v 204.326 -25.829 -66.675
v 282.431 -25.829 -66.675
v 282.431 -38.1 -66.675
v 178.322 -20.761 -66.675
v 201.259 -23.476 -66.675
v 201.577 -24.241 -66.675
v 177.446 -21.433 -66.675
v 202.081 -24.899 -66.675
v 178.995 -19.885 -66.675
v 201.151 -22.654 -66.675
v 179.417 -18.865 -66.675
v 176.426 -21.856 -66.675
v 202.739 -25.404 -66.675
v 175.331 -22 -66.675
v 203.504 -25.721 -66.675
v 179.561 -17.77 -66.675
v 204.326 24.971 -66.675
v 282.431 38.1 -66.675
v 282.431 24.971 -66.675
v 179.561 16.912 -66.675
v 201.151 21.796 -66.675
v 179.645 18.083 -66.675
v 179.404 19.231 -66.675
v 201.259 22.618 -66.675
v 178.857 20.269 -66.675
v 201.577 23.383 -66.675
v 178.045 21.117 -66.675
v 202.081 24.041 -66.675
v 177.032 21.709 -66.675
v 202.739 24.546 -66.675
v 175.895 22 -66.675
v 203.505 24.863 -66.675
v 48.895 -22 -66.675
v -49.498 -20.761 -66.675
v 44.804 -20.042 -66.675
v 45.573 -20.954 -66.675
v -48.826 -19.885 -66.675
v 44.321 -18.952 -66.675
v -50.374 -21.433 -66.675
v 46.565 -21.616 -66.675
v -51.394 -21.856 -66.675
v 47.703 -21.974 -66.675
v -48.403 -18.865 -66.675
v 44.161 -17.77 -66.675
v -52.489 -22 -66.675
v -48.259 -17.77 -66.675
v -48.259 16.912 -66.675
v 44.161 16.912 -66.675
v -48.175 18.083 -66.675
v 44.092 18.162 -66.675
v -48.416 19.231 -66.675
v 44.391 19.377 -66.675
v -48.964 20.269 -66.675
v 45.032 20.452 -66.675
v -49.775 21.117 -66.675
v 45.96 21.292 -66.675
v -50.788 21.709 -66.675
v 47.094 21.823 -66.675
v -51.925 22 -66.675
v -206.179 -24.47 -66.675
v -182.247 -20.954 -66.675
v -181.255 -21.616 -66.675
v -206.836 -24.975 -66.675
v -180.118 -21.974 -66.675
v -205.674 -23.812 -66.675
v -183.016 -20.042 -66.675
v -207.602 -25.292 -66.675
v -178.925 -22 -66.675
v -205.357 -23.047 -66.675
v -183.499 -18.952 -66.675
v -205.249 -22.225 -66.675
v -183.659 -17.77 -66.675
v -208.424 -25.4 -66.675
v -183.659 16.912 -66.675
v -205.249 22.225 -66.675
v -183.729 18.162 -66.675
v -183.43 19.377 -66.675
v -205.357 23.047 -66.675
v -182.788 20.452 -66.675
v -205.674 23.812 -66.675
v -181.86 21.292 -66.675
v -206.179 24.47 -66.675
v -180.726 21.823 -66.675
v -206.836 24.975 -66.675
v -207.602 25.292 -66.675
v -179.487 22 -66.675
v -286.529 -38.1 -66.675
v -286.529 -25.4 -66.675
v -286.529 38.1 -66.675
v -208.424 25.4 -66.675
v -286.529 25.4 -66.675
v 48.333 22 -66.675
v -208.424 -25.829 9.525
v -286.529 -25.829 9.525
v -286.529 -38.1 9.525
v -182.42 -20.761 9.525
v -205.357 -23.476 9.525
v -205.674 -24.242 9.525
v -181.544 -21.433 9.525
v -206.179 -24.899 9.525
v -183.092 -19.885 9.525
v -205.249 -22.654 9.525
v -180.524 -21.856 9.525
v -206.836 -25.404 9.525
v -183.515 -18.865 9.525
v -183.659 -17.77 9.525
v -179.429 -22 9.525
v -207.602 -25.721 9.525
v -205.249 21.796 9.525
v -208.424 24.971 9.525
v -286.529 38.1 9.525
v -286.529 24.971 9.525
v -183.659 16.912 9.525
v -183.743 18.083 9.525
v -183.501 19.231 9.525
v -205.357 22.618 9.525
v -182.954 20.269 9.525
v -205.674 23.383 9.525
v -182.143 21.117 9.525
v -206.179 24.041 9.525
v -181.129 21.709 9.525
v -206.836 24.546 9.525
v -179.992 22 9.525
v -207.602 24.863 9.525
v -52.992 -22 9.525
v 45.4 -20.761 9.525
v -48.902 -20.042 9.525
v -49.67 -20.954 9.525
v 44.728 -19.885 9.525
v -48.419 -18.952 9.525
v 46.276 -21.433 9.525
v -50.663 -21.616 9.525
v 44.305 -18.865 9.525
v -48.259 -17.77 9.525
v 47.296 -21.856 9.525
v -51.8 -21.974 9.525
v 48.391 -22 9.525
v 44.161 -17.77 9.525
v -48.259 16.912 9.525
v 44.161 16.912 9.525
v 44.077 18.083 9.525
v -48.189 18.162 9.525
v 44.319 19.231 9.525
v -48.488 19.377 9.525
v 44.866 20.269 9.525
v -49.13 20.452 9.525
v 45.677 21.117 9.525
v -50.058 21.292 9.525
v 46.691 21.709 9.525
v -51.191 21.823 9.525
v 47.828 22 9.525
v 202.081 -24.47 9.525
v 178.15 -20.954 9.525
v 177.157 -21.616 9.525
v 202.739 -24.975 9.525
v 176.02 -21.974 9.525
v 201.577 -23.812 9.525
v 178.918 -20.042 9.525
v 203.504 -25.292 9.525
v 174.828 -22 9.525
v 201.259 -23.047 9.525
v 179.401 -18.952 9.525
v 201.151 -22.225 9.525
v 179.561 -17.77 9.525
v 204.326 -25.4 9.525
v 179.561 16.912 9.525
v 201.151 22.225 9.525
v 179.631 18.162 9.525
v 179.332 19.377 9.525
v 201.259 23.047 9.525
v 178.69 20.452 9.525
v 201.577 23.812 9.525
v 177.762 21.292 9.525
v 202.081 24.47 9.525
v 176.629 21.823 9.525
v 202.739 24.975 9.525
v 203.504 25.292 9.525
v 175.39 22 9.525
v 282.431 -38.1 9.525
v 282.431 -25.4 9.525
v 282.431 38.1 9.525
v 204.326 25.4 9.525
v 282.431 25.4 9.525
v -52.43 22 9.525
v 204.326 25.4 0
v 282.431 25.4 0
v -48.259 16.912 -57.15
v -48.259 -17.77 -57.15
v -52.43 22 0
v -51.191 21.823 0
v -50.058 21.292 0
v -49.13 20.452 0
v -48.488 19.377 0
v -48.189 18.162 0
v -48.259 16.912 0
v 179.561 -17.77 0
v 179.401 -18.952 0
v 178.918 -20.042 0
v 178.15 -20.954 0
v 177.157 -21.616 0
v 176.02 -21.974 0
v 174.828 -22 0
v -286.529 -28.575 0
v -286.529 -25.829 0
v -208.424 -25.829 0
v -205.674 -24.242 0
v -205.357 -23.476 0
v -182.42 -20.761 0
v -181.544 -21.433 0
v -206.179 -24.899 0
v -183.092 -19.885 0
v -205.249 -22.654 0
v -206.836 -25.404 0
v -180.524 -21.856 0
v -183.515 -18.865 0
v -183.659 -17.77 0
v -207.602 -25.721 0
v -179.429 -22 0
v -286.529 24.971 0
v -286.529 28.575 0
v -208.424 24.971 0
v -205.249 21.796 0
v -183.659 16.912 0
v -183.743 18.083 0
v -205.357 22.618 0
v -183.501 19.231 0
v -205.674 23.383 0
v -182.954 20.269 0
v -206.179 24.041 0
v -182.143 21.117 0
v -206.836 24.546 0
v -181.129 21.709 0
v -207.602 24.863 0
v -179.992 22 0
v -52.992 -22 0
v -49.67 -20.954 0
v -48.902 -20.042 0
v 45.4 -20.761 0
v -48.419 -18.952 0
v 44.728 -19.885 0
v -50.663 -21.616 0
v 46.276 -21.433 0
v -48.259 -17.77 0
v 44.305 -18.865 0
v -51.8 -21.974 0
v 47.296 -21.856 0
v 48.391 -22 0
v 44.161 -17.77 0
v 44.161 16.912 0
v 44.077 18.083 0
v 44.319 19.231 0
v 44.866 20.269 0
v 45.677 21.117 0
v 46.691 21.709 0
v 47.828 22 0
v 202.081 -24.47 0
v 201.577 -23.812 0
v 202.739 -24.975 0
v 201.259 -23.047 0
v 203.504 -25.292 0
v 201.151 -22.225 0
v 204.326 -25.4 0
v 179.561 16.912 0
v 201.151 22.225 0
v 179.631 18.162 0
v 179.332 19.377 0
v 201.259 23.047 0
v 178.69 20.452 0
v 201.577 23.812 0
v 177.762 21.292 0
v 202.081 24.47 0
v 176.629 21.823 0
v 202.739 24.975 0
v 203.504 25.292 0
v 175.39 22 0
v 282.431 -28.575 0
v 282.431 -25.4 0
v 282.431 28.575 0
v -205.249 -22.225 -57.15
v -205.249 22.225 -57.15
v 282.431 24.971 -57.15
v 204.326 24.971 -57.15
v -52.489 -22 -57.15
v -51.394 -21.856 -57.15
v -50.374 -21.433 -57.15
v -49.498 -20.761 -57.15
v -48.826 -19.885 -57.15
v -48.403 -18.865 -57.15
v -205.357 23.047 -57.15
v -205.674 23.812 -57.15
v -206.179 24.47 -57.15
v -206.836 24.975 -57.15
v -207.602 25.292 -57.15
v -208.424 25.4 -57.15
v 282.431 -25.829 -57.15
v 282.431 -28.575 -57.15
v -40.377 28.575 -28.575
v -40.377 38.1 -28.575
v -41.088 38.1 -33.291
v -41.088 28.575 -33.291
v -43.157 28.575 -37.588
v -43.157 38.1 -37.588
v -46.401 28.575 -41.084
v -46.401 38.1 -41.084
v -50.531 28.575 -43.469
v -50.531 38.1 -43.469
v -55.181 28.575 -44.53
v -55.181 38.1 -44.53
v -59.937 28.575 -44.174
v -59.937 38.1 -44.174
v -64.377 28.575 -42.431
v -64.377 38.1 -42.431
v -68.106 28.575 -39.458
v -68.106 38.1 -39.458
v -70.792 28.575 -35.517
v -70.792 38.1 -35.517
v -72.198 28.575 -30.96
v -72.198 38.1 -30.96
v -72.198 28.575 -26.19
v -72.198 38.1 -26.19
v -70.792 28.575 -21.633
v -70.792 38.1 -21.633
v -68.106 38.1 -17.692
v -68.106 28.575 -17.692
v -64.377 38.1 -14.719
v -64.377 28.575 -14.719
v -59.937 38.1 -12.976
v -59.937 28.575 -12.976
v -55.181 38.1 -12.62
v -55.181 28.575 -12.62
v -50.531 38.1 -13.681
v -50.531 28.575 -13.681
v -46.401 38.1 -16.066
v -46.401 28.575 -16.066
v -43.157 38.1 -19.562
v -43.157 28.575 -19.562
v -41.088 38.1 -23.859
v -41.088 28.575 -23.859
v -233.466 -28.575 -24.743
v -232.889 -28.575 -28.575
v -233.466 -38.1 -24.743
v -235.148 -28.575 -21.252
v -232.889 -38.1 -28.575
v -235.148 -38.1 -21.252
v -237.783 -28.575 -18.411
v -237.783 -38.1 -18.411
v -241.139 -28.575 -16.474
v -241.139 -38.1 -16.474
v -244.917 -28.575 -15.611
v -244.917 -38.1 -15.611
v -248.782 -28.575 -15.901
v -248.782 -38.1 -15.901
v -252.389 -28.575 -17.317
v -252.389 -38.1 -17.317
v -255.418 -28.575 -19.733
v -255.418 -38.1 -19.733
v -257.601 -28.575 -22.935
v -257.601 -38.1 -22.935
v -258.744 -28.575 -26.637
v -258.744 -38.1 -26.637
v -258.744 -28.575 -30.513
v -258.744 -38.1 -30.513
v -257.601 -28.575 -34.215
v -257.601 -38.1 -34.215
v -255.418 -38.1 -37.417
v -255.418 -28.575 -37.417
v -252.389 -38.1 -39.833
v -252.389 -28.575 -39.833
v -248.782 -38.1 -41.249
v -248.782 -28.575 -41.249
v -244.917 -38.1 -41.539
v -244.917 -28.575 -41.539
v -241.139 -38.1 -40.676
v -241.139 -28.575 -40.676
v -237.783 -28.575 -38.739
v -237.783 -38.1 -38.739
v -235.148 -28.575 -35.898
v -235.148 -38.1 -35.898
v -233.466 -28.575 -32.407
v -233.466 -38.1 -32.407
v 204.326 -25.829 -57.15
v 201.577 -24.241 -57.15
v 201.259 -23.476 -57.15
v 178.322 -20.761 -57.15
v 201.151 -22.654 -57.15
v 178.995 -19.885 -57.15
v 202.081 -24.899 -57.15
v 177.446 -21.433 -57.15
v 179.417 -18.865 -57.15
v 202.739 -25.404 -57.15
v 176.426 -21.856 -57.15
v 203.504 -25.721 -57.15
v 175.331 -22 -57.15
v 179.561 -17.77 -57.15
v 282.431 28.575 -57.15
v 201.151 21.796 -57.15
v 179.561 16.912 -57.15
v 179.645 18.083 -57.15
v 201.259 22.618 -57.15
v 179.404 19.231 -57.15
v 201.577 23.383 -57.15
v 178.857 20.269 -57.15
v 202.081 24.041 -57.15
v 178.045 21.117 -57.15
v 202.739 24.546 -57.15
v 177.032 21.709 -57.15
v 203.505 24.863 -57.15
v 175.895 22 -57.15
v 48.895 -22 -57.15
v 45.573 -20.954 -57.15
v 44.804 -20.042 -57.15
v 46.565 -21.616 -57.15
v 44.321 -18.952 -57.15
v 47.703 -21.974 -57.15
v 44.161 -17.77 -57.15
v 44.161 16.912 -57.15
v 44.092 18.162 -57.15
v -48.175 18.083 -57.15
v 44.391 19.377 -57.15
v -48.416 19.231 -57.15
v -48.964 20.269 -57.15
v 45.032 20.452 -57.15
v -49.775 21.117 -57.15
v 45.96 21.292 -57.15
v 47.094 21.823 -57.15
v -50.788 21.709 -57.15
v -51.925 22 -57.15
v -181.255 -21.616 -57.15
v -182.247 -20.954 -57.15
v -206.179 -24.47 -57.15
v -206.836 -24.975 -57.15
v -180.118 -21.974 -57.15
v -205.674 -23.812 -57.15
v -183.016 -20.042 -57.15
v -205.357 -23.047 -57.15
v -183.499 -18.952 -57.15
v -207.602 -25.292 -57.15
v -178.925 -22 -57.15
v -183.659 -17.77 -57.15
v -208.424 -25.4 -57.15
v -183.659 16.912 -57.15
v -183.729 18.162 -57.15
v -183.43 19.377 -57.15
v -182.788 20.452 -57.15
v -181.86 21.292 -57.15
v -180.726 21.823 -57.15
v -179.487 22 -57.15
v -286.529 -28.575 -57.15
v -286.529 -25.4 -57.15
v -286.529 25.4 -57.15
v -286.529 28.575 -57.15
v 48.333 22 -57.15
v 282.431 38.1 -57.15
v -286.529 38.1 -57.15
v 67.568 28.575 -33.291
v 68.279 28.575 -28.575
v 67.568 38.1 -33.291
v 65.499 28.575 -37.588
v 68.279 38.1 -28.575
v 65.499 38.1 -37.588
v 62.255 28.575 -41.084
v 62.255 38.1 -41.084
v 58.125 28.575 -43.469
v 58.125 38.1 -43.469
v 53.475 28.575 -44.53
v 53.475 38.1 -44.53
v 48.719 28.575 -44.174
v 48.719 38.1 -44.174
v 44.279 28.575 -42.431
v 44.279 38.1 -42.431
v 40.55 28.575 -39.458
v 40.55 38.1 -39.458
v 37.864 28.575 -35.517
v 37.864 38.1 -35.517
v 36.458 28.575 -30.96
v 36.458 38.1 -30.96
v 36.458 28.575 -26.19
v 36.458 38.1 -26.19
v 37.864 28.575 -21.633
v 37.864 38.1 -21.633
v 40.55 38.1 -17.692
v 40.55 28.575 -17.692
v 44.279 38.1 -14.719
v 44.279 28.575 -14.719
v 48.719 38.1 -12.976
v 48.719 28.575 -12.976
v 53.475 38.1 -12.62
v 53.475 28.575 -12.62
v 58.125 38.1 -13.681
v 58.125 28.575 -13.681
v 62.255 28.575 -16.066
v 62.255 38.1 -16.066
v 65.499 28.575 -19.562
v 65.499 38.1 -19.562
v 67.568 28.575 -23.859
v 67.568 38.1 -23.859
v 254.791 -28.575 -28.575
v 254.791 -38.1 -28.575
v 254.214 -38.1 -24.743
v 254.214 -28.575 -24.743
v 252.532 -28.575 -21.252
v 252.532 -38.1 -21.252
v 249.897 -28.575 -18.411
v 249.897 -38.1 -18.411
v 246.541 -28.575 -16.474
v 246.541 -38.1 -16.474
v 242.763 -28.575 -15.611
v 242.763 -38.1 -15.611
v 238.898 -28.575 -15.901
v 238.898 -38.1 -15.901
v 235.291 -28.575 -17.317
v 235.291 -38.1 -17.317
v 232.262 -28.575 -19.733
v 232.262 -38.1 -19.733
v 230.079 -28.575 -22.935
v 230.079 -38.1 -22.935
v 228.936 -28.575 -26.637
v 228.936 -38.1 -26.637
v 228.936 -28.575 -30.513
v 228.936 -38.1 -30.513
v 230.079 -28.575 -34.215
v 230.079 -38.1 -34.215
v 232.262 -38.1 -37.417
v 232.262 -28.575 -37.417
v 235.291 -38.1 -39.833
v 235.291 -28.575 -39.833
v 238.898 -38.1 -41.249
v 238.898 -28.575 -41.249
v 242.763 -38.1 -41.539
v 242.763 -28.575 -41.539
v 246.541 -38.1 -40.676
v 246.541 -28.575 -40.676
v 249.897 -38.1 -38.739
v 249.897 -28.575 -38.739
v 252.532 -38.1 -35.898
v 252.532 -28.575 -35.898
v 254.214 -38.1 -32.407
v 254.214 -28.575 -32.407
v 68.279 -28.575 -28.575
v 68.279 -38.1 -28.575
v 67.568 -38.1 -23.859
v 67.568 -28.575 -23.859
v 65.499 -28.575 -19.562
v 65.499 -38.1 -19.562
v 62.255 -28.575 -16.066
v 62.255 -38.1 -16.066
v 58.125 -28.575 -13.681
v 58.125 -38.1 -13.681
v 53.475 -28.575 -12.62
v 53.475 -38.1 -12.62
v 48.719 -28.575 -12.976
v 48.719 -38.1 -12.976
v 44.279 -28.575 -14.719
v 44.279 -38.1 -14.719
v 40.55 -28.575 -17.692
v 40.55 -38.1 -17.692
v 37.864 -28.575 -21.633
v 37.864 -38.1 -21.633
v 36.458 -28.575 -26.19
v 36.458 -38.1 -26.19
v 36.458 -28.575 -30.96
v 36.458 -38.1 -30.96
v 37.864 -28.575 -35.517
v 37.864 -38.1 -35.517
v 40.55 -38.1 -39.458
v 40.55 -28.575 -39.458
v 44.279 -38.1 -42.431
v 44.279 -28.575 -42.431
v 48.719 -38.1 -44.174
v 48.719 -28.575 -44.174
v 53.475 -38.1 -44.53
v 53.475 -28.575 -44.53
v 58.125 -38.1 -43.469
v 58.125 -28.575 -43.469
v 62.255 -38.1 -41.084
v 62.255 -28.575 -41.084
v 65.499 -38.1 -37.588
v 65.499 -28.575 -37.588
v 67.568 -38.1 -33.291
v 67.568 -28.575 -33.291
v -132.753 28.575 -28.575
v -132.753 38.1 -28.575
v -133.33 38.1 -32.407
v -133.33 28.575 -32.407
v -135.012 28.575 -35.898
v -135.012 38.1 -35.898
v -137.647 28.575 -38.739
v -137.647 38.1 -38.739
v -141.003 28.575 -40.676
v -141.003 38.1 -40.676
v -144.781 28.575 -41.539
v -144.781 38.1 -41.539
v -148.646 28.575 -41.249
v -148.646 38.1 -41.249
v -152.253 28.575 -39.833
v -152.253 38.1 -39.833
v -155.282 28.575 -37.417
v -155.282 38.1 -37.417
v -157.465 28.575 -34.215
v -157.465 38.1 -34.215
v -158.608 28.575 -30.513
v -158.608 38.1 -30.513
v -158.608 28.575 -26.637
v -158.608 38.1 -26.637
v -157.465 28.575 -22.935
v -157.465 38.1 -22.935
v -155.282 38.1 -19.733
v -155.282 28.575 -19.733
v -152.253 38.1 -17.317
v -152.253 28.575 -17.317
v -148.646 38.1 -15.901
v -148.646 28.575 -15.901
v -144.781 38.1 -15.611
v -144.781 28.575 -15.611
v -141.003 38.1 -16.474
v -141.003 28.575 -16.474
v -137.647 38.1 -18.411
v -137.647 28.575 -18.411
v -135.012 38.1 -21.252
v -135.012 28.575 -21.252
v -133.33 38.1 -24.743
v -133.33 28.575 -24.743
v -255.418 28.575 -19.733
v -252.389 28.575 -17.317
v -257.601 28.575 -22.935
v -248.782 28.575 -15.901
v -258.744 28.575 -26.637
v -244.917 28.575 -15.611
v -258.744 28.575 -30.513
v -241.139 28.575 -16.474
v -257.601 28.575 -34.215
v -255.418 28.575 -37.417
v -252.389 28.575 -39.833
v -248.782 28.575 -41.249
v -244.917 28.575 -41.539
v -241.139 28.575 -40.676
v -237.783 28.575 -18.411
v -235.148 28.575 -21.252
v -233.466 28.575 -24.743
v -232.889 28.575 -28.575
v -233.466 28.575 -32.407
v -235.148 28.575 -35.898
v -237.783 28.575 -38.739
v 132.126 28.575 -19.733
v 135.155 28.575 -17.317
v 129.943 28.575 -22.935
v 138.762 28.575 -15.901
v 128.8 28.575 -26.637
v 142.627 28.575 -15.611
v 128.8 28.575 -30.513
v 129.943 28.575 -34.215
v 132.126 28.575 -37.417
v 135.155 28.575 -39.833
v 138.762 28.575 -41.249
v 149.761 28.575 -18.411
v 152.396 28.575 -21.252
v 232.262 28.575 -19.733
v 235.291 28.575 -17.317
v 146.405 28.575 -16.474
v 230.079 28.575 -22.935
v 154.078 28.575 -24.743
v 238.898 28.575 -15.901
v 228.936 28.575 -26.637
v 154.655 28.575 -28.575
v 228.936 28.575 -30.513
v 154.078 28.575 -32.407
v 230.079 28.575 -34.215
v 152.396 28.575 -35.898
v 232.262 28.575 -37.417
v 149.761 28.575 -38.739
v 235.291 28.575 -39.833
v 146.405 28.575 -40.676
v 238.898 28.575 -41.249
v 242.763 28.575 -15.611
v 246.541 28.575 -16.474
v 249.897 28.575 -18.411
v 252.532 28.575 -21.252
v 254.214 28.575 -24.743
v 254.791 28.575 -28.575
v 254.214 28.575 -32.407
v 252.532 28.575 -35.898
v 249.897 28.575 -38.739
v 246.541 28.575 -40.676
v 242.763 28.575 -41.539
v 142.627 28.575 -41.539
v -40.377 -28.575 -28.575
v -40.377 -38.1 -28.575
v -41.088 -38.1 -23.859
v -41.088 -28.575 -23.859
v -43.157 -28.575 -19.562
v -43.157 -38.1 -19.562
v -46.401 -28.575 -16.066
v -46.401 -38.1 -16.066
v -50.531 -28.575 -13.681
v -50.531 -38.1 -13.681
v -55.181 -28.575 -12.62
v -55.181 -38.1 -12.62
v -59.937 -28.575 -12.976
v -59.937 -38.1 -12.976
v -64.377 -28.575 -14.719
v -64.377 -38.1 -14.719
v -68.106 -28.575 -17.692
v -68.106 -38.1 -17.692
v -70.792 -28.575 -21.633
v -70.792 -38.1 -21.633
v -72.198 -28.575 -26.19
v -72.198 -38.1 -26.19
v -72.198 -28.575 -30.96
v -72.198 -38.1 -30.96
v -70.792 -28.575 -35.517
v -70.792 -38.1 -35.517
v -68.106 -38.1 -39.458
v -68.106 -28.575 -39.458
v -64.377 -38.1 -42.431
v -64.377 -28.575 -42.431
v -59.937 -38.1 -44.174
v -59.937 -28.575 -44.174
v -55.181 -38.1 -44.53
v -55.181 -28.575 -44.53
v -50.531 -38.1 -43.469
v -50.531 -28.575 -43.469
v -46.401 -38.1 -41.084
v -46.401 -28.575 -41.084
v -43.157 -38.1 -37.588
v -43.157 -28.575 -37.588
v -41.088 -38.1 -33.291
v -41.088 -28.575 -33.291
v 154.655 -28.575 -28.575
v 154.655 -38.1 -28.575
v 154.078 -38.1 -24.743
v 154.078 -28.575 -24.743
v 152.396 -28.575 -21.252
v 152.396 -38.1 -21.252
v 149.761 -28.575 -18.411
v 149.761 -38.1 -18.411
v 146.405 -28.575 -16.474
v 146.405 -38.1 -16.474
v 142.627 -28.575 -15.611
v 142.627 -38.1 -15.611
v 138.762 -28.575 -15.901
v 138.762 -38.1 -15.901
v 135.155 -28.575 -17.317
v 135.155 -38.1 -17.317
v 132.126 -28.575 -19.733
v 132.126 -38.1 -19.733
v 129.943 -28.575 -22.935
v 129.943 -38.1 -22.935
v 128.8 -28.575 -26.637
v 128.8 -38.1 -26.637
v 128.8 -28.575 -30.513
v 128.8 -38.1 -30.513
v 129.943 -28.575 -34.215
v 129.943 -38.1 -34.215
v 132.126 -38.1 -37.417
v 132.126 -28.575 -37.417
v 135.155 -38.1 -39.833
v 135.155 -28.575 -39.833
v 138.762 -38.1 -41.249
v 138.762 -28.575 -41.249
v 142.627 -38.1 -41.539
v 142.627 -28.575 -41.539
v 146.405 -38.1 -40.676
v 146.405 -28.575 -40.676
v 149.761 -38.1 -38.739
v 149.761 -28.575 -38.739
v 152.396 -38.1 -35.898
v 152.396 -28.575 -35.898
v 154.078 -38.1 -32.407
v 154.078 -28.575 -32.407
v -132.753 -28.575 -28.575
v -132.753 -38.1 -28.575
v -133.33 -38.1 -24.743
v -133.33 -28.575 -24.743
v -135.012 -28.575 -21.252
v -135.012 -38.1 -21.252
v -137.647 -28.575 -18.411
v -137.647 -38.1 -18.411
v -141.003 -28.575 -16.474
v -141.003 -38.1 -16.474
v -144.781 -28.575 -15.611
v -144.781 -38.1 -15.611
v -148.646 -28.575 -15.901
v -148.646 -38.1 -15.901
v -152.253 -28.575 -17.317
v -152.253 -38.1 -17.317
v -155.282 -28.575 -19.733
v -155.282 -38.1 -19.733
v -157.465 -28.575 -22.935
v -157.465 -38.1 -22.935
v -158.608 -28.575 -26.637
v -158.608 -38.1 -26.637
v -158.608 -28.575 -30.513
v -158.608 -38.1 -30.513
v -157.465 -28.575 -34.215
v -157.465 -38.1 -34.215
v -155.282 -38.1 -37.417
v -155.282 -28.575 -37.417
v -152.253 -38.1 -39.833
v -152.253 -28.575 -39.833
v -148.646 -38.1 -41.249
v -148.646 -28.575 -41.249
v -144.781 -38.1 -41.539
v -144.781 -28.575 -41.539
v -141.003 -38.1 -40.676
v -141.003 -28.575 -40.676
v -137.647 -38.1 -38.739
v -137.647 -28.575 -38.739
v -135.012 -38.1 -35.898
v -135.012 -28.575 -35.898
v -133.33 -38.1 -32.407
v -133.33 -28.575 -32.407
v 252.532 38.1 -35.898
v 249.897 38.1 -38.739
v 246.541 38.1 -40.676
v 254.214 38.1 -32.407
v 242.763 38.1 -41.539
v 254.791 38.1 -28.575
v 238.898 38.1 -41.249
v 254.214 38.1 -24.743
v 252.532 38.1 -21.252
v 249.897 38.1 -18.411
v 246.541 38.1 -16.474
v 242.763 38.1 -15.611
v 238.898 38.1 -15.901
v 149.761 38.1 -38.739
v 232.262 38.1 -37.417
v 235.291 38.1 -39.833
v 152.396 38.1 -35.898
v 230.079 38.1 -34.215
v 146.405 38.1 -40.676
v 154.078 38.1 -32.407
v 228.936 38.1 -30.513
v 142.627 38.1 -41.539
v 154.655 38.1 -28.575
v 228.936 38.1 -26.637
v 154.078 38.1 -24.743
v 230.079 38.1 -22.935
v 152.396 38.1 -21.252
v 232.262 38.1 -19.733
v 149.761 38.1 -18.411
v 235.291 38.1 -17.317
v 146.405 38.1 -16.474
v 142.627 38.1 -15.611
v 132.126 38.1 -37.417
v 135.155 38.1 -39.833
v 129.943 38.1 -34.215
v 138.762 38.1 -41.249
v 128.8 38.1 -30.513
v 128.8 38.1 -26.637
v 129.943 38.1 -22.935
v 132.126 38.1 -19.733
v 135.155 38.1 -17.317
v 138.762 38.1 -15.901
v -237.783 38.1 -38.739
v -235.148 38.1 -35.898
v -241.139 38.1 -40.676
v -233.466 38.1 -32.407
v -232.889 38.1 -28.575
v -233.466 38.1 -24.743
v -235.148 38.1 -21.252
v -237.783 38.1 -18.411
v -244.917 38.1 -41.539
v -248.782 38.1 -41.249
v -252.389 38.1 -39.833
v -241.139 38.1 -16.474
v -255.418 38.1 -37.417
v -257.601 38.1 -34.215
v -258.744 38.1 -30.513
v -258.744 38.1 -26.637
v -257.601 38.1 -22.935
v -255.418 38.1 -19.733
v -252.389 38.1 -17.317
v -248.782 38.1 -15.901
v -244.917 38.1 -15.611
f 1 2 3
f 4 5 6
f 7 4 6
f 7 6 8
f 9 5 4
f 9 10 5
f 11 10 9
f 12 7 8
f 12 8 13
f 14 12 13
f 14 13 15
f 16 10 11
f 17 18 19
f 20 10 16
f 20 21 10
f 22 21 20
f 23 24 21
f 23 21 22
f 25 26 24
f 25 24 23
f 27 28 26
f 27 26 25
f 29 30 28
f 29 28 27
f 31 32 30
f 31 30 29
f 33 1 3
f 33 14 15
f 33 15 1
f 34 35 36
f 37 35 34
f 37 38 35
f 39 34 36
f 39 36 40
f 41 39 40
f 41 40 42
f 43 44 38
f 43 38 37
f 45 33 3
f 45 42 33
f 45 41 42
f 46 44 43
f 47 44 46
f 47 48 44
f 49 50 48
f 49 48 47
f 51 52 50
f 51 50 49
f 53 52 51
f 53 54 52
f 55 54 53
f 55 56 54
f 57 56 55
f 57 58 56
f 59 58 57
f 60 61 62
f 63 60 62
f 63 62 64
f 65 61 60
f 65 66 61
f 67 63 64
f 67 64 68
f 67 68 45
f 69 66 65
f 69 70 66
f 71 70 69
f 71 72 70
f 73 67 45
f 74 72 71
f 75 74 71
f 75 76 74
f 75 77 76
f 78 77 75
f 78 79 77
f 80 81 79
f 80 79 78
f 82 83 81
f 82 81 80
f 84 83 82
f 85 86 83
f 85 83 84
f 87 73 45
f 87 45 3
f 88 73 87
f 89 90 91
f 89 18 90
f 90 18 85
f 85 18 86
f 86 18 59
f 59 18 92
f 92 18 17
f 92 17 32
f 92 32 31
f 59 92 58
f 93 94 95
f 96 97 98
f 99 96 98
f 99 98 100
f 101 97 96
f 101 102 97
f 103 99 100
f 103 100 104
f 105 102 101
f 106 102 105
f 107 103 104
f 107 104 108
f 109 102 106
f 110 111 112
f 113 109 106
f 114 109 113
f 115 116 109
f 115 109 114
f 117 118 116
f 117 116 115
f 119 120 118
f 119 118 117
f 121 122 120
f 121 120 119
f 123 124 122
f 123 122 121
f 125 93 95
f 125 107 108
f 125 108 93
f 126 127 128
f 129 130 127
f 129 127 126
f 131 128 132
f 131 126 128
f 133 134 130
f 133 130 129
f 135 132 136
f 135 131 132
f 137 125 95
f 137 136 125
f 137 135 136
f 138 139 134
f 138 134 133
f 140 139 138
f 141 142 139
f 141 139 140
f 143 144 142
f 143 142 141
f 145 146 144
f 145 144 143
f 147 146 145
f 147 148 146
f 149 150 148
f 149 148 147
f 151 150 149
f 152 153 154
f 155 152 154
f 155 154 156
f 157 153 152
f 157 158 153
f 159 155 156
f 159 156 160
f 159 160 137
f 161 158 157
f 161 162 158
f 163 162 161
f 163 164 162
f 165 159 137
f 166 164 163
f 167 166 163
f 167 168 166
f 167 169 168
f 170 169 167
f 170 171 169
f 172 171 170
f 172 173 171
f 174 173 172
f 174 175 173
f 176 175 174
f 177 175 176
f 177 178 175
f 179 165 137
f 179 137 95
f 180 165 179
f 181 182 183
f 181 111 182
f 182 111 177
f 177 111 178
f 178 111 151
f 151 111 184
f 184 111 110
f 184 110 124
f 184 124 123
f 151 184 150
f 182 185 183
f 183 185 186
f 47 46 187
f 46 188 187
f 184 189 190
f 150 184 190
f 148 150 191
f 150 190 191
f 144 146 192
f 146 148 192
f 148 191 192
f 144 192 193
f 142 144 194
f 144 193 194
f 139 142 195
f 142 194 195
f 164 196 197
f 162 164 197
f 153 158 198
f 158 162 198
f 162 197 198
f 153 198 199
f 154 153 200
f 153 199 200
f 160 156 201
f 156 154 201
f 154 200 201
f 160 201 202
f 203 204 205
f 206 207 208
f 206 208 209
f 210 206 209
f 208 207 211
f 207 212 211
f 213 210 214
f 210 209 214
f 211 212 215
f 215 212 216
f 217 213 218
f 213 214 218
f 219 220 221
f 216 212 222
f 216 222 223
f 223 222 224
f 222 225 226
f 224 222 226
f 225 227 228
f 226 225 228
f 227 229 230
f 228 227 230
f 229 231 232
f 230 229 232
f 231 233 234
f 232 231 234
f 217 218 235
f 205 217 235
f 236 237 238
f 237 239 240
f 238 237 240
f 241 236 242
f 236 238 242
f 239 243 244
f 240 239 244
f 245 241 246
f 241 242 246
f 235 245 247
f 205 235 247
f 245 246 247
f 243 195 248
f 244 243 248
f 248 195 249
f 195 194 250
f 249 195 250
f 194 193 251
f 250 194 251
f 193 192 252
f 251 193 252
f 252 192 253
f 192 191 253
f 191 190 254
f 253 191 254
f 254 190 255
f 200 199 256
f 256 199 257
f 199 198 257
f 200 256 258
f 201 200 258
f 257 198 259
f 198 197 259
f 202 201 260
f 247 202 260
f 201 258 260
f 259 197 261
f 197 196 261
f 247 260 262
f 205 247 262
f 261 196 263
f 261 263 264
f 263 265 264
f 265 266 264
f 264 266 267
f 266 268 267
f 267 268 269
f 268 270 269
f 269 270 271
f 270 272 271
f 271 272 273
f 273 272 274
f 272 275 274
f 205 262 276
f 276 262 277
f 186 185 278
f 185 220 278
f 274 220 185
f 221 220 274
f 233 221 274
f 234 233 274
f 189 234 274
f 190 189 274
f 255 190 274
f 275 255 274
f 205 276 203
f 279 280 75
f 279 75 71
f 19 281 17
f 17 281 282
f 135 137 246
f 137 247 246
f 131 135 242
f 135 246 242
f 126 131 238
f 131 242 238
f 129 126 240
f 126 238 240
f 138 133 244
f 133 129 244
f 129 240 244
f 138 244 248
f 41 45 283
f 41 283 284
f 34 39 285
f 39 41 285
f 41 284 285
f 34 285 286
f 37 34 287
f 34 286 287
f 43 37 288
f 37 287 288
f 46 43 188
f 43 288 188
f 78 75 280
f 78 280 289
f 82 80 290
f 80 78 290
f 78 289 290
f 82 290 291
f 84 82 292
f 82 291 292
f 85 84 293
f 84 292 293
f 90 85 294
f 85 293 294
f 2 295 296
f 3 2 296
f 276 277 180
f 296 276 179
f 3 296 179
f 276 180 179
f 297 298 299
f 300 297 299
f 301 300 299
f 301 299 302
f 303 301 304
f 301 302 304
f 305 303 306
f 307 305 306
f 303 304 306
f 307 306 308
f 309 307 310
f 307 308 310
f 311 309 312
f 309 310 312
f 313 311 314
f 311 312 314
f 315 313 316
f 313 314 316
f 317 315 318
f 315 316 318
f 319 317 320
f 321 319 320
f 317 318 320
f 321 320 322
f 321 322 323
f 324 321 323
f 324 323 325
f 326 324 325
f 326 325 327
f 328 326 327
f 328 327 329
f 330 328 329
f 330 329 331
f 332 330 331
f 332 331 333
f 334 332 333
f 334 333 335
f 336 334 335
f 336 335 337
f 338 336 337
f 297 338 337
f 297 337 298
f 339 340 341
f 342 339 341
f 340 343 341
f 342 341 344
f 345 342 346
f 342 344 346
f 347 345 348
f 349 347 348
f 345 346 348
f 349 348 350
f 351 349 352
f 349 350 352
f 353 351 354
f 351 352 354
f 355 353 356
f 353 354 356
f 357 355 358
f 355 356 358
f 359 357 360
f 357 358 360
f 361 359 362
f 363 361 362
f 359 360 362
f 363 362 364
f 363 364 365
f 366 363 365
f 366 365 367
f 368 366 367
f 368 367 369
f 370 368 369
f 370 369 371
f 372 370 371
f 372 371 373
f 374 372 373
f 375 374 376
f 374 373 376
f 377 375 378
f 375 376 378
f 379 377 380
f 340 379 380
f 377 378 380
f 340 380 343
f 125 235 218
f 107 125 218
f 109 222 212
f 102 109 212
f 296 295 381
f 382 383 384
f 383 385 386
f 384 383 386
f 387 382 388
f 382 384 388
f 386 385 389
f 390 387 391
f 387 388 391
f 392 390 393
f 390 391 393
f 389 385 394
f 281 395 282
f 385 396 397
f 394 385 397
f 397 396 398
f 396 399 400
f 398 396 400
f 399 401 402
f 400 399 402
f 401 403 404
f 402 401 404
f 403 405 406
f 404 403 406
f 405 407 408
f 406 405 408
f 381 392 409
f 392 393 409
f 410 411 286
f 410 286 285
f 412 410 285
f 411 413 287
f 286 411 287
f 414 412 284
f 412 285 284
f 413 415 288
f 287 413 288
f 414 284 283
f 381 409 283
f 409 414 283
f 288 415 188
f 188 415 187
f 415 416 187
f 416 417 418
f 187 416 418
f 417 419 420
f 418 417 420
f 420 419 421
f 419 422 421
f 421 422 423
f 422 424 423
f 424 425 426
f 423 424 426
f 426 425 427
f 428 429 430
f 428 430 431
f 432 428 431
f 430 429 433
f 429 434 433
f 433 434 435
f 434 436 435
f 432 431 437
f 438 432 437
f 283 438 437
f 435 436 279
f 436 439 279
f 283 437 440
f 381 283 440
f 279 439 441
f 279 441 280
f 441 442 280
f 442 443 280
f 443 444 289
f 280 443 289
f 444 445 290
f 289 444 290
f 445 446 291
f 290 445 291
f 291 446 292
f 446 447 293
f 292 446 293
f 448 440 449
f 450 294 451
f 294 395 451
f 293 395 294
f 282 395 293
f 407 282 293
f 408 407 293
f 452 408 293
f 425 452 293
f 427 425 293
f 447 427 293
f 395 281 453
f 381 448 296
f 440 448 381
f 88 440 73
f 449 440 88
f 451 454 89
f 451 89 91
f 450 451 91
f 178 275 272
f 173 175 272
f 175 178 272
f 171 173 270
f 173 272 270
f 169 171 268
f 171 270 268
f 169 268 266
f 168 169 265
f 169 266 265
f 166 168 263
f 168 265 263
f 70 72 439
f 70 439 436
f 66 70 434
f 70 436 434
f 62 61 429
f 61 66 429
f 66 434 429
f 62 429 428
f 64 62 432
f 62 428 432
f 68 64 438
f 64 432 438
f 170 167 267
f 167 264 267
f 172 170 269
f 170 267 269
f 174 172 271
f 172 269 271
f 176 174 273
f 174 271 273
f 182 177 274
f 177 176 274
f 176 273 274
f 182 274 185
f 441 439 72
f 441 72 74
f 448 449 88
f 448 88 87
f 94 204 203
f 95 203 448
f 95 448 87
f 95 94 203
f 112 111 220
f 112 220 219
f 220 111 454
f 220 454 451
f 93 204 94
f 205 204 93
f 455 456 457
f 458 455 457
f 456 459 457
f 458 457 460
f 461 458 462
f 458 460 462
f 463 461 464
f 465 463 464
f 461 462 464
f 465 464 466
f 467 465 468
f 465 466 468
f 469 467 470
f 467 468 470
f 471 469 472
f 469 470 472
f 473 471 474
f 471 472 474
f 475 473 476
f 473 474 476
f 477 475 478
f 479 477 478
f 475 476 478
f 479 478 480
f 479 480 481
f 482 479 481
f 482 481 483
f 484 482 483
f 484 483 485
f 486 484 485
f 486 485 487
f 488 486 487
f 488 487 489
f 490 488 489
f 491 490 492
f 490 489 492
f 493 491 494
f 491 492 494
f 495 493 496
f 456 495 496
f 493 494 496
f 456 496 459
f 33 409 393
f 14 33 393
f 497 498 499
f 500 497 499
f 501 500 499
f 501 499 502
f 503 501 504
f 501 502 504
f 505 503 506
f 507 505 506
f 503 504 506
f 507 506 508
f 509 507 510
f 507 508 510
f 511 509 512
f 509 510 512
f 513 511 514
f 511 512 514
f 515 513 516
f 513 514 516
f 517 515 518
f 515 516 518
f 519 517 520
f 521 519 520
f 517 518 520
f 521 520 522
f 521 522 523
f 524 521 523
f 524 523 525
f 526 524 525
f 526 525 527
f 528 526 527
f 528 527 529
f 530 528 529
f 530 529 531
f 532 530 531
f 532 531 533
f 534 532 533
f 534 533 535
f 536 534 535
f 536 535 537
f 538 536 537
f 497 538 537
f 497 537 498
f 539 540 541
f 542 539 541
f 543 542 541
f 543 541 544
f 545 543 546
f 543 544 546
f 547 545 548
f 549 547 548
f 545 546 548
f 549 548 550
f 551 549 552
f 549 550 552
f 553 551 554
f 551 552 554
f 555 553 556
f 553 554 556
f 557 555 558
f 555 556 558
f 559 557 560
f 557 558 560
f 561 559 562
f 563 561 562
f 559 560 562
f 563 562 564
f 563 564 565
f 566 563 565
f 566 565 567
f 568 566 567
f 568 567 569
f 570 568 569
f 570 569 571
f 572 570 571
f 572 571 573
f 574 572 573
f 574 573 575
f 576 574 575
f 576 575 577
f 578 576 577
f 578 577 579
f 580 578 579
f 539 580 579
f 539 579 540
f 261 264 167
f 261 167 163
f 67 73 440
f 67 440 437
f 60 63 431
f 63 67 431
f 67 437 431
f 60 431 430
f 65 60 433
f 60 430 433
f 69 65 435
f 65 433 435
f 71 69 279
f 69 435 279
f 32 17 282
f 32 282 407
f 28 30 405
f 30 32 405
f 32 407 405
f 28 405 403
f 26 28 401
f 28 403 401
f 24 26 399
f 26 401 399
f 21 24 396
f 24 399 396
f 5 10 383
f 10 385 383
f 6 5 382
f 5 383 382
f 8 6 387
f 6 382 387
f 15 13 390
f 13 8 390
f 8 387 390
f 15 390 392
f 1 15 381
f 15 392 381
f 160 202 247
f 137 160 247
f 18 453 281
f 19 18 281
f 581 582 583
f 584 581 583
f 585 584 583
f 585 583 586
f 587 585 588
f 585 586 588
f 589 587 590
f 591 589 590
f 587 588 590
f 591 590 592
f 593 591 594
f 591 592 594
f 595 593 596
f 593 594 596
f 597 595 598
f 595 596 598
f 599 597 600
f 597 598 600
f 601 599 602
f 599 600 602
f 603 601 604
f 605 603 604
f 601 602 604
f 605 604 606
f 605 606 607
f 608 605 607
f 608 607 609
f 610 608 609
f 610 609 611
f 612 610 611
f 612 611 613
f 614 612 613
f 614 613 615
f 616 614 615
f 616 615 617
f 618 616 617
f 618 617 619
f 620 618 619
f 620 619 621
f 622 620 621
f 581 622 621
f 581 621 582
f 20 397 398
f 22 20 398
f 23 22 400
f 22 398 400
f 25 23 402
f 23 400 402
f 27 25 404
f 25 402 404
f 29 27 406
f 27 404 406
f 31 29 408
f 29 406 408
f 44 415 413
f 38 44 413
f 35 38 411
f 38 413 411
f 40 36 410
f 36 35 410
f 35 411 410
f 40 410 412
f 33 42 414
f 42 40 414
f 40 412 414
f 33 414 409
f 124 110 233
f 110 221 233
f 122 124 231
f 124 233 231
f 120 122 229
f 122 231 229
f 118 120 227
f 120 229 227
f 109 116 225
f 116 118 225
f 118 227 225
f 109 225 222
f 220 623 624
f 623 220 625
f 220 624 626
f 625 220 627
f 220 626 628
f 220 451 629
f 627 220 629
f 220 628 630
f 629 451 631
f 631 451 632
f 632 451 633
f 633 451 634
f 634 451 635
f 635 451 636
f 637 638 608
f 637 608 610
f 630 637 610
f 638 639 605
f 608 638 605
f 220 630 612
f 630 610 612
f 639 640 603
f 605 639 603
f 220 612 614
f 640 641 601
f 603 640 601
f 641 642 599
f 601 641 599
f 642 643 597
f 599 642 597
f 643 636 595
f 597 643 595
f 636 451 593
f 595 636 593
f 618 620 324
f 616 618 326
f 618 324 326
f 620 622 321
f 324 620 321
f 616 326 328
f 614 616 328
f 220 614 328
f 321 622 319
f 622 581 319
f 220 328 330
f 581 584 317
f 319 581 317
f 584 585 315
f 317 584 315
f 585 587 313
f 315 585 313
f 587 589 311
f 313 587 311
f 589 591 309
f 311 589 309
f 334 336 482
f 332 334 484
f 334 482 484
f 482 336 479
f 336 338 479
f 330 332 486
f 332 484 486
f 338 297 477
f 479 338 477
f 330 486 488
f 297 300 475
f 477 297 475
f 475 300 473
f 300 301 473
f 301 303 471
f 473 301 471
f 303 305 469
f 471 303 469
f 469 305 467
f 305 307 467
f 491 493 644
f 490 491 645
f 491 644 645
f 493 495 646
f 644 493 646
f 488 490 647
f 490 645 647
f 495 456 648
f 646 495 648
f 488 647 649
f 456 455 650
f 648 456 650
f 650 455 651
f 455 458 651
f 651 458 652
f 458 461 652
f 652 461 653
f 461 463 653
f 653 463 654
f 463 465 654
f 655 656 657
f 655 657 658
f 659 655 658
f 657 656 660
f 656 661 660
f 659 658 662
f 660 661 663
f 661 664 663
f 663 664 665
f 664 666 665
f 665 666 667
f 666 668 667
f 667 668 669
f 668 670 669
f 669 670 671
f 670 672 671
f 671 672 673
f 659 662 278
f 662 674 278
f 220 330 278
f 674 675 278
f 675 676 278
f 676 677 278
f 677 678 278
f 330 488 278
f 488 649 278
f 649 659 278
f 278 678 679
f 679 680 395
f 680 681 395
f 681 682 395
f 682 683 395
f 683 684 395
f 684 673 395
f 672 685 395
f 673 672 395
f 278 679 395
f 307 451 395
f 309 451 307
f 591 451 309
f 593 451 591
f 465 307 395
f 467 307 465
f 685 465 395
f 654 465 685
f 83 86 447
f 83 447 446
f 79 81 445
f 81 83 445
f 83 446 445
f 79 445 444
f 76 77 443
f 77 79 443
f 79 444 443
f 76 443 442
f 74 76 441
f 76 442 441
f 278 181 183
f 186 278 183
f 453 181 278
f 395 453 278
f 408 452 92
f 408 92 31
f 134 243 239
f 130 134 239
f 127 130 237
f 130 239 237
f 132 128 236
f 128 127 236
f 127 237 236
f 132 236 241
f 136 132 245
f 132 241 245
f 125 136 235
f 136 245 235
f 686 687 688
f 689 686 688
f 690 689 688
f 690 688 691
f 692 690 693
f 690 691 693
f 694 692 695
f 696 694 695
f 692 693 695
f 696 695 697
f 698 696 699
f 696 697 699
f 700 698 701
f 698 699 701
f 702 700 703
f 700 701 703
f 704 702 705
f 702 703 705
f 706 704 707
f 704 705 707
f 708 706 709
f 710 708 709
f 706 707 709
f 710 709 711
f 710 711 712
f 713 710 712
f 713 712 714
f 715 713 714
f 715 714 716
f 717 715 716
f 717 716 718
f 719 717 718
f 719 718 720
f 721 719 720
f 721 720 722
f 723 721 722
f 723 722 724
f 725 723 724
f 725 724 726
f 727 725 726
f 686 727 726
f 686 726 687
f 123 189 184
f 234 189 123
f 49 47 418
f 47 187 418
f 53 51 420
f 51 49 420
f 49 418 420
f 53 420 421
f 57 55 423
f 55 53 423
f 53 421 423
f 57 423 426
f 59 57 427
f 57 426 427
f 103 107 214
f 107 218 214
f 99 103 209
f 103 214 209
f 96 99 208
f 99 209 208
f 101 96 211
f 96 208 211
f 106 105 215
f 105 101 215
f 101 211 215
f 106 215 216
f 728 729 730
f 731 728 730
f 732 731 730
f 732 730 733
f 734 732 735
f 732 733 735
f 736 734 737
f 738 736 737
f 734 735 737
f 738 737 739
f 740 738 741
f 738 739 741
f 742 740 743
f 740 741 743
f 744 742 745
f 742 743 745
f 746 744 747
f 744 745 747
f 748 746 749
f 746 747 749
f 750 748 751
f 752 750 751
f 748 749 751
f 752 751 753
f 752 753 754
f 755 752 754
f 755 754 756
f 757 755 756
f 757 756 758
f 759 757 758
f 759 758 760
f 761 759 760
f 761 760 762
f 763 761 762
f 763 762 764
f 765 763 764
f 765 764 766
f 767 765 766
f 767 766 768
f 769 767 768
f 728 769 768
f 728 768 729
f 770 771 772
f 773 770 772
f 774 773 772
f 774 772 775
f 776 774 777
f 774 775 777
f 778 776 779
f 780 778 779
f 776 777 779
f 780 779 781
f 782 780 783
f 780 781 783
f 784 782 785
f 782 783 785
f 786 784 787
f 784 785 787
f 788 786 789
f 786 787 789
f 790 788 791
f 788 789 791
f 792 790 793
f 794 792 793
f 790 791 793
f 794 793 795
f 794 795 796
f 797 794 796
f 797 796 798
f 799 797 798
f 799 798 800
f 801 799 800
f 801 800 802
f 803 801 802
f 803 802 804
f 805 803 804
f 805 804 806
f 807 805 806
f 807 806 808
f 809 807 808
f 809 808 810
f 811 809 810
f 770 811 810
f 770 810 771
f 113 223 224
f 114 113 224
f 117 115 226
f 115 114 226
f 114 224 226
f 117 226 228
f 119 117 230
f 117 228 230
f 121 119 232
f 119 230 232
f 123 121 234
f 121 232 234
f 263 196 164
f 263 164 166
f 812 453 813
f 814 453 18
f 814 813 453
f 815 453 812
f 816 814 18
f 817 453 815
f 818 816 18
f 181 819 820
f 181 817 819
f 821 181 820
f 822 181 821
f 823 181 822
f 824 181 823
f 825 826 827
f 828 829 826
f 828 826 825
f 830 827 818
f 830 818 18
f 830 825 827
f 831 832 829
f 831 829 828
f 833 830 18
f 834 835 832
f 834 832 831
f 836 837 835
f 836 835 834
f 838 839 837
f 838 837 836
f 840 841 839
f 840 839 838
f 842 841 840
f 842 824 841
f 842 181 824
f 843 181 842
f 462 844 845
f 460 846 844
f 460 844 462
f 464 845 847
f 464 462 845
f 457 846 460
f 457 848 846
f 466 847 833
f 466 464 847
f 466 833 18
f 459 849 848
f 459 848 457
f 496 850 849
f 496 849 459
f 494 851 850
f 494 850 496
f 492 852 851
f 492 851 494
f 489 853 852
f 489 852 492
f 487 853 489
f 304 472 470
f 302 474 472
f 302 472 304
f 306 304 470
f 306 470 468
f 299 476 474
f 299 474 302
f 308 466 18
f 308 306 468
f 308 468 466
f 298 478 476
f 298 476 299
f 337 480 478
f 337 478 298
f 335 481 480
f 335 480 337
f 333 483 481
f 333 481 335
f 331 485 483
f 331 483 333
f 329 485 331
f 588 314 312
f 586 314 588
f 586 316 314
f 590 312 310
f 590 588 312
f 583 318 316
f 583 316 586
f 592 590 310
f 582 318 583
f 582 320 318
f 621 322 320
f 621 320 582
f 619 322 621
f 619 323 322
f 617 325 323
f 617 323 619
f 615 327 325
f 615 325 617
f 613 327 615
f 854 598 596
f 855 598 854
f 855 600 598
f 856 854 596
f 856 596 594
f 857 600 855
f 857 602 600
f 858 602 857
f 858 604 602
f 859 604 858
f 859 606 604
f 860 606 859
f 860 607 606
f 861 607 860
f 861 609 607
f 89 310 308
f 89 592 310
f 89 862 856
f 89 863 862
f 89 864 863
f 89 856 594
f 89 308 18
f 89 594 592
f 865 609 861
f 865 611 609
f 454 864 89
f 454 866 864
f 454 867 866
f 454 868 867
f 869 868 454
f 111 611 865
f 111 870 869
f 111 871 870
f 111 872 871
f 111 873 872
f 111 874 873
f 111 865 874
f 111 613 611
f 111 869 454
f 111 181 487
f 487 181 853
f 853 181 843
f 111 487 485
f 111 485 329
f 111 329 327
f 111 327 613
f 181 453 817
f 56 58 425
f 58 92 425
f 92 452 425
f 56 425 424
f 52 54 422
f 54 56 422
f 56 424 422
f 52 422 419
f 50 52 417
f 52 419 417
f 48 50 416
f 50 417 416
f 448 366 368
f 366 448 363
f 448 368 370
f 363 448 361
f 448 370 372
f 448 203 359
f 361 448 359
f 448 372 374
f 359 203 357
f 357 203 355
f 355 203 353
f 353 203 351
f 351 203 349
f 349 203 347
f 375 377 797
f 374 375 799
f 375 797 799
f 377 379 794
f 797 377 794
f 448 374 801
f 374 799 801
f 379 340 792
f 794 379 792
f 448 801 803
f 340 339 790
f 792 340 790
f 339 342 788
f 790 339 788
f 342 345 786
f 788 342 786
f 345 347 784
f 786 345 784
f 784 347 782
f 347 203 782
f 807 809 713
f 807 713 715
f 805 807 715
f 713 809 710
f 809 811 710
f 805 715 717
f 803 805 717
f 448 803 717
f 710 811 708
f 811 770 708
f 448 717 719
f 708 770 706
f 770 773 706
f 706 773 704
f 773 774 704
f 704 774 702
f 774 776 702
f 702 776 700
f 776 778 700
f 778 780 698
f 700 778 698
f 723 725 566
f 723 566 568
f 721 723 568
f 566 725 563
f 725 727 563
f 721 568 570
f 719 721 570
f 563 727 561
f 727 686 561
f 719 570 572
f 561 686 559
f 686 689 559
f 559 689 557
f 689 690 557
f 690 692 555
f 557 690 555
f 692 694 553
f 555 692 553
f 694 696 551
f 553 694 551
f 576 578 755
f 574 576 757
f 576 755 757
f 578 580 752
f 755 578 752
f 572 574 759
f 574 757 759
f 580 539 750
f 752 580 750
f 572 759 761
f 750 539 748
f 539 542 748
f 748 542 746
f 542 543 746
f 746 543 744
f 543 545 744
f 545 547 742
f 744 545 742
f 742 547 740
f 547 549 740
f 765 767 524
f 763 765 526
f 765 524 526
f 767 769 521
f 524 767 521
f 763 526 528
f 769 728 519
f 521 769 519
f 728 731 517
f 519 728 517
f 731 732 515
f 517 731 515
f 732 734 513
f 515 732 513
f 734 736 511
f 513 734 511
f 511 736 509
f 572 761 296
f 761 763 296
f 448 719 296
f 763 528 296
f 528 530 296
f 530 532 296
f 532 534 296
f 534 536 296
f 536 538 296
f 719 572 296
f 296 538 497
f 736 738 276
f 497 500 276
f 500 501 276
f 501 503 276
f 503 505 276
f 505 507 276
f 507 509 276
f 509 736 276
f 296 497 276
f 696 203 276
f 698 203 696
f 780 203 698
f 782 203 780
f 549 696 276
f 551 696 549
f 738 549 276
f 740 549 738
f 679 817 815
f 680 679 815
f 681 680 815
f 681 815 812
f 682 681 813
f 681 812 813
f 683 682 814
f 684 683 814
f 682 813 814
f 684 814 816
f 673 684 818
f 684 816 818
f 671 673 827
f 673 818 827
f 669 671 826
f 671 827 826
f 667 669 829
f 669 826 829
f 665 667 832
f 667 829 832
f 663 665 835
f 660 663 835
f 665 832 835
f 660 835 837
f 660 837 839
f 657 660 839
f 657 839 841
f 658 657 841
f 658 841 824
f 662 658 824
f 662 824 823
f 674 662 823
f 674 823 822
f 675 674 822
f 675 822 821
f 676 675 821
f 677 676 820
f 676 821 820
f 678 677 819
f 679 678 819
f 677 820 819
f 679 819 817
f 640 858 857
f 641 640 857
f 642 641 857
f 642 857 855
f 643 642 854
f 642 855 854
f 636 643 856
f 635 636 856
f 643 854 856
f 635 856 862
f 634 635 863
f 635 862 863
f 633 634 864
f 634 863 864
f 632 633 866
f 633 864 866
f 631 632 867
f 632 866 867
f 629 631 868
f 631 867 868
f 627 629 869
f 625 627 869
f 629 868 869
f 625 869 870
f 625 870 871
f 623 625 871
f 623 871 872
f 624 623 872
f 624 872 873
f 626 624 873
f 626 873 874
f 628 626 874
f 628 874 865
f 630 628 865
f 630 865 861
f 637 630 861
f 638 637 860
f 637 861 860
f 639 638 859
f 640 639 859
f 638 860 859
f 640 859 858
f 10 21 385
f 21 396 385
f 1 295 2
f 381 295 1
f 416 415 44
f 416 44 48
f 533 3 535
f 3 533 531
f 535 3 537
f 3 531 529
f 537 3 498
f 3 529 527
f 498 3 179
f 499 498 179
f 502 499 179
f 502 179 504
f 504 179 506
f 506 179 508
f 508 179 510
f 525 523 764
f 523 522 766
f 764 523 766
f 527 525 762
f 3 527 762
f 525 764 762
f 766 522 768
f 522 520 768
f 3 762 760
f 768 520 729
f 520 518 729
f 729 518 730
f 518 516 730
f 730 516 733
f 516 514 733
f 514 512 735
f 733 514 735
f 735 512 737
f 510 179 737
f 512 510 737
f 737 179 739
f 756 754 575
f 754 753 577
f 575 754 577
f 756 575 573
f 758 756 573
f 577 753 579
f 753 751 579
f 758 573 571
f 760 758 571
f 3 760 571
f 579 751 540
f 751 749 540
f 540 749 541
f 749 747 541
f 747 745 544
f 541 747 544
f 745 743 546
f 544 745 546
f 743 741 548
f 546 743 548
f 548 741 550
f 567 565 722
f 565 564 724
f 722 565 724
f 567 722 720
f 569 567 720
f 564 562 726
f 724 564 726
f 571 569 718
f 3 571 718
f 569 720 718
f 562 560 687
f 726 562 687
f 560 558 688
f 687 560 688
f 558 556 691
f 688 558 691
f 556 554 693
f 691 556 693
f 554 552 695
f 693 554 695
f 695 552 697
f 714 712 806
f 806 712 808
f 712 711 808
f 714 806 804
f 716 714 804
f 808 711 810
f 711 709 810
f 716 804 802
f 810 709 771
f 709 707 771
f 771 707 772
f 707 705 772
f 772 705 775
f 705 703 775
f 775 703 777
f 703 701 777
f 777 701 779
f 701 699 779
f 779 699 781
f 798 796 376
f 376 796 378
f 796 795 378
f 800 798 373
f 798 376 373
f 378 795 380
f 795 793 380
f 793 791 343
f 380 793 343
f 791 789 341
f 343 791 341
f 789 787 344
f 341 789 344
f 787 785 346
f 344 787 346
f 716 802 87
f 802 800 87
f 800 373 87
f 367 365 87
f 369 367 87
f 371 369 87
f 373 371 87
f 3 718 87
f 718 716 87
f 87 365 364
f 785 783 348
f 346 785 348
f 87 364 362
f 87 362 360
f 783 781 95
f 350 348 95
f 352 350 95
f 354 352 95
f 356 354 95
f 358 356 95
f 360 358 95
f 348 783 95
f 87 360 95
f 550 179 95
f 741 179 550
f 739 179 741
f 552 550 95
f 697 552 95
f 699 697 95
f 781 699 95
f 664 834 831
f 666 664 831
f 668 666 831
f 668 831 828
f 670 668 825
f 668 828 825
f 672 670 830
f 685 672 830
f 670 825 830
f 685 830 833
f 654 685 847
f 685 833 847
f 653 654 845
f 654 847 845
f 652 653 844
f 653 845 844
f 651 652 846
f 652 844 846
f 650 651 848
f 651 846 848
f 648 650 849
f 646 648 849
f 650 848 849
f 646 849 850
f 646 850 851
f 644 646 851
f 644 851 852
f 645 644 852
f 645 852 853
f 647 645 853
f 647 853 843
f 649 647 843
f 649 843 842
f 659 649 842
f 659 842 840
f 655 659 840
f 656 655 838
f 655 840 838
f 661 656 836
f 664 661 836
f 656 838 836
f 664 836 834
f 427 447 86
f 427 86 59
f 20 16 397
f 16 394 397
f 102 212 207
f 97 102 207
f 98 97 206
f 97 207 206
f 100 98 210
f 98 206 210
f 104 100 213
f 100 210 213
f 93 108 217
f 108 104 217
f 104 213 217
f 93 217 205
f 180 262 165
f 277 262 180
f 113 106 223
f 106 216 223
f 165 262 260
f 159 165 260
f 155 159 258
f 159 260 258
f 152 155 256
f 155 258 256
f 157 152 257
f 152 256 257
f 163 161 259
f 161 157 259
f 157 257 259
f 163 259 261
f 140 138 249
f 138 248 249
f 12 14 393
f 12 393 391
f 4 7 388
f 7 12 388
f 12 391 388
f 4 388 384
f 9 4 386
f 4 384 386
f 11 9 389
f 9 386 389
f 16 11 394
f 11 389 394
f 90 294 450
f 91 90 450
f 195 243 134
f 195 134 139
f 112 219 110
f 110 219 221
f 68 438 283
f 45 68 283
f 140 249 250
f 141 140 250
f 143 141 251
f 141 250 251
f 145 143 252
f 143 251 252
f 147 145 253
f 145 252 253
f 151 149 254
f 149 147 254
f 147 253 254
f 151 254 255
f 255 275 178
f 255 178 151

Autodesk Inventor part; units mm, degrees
ref_plane "YZ Plane" through (0, 0, 0) normal (1, 0, 0) x (0, 1, 0)
ref_plane "XZ Plane" through (0, 0, 0) normal (0, 1, 0) x (-1, 0, 0)
ref_plane "XY Plane" through (0, 0, 0) normal (0, 0, 1) x (1, 0, 0)
sketch "Sketch1" plane through (0, 0, 0) normal (0, 0, 1) x (1, 0, 0)
  arc A0 (-183.6588, -17.77) -> (-179.4288, -22) centre (-179.4288, -17.77) ccw
  arc A1 (-179.9924, 22) -> (-183.6588, 16.912) centre (-179.5223, 17.7962) ccw
  line L0 (-183.6588, -17.77) -> (-183.6588, 16.912)
  line L1 (-205.2488, 21.796) -> (-205.2488, -22.654)
  line L2 (-286.5288, 24.971) -> (-208.4238, 24.971)
  line L3 (-286.5288, -25.829) -> (-208.4238, -25.829)
  line L4 (-52.9925, -22) -> (-179.4288, -22)
  line L5 (-52.4305, 22) -> (-179.9924, 22)
  arc A2 (-48.2588, 16.912) -> (-52.4305, 22) centre (-52.4009, 17.7701) ccw
  line L6 (-48.2588, -17.77) -> (-48.2588, 16.912)
  arc A3 (-52.9925, -22) -> (-48.2588, -17.77) centre (-52.4887, -17.8001) ccw
  arc A4 (-205.2488, 21.796) -> (-208.4238, 24.971) centre (-208.4238, 21.796) ccw
  arc A5 (-208.4238, -25.829) -> (-205.2488, -22.654) centre (-208.4238, -22.654) ccw
  line L7 (204.3262, -25.4) -> (282.4312, -25.4)
  line L8 (204.3262, 25.4) -> (282.4312, 25.4)
  line L9 (44.1612, -17.77) -> (44.1612, 16.912)
  arc A6 (44.1612, -17.77) -> (48.3912, -22) centre (48.3912, -17.77) ccw
  line L10 (175.3896, 22) -> (47.8276, 22)
  line L11 (174.8276, -22) -> (48.3912, -22)
  arc A7 (174.8276, -22) -> (179.5612, -17.77) centre (175.3313, -17.8001) ccw
  arc A8 (179.5612, 16.912) -> (175.3896, 22) centre (175.4192, 17.7701) ccw
  arc A9 (47.8276, 22) -> (44.1612, 16.912) centre (48.2978, 17.7962) ccw
  line L12 (179.5612, -17.77) -> (179.5612, 16.912)
  arc A10 (201.1512, -22.225) -> (204.3262, -25.4) centre (204.3262, -22.225) ccw
  arc A11 (204.3262, 25.4) -> (201.1512, 22.225) centre (204.3262, 22.225) ccw
  line L13 (201.1512, 22.225) -> (201.1512, -22.225)
  line L14 (-286.5288, 38.1) -> (282.4312, 38.1)
  line L15 (-286.5288, -38.1) -> (282.4312, -38.1)
  line L16 (282.4312, 38.1) -> (282.4312, 25.4)
  line L17 (282.4312, -25.4) -> (282.4312, -38.1)
  line L18 (-286.5288, 38.1) -> (-286.5288, 24.971)
  line L19 (-286.5288, -25.829) -> (-286.5288, -38.1)
  point P0 (0, 0)
  dimension "d0" = 135.4
  dimension "d1" = 44
  dimension "d2" = 78.105
  dimension "d3" = 50.8
  dimension "d4" = 44.45
  dimension "d5" = 21.59
  dimension "d6" = 135.4
  dimension "d7" = 44
  dimension "d8" = 78.105
  dimension "d9" = 50.8
  dimension "d10" = 568.96
  dimension "d11" = 21.59
extrude "Extrusion1" add sketch "Sketch1" along normal blind 9.525
sketch "Sketch2" plane through (-286.5288, 38.1, 0) normal (0, 1, 0) x (1, 0, 0)
  line L0 (0, 57.15) -> (568.96, 57.15)
  line L1 (568.96, 57.15) -> (568.96, 0)
  line L2 (568.96, 0) -> (0, 0)
  line L3 (0, 0) -> (0, 57.15)
  circle A0 centre (40.64, 28.575) radius 13
  circle A1 centre (140.776, 28.575) radius 13
  circle A2 centre (230.152, 28.575) radius 16
  circle A3 centre (528.32, 28.575) radius 13
  circle A4 centre (428.184, 28.575) radius 13
  circle A5 centre (338.808, 28.575) radius 16
  point P0 (286.5288, 0)
  point P1 (99.06, 38.1)
  dimension "d14" = 26
  dimension "d15" = 26
  dimension "d16" = 32
  dimension "d17" = 26
  dimension "d18" = 26
  dimension "d19" = 32
  dimension "d20" = 568.96
  dimension "d21" = 57.15
  dimension "d22" = 40.64
  dimension "d23" = 140.776
  dimension "d24" = 230.152
  dimension "d25" = 230.152
  dimension "d26" = 40.64
  dimension "d27" = 140.776
extrude "Extrusion2" add sketch "Sketch2" against normal blind 9.525
sketch "Sketch3" plane through (-286.5288, -38.1, 0) normal (0, -1, 0) x (1, 0, 0)
  line L0 (0, 0) -> (568.96, 0)
  line L1 (568.96, 0) -> (568.96, -57.15)
  line L2 (568.96, -57.15) -> (0, -57.15)
  line L3 (0, -57.15) -> (0, 0)
  circle A0 centre (40.64, -28.575) radius 13
  circle A1 centre (140.776, -28.575) radius 13
  circle A2 centre (230.152, -28.575) radius 16
  circle A3 centre (528.32, -28.575) radius 13
  circle A4 centre (428.184, -28.575) radius 13
  circle A5 centre (338.808, -28.575) radius 16
  point P0 (286.5288, 0)
  dimension "d30" = 26
  dimension "d31" = 26
  dimension "d32" = 32
  dimension "d33" = 26
  dimension "d34" = 26
  dimension "d35" = 32
  dimension "d36" = 568.96
  dimension "d37" = 57.15
  dimension "d38" = 40.64
  dimension "d39" = 140.776
  dimension "d40" = 230.152
  dimension "d41" = 230.152
  dimension "d42" = 40.64
  dimension "d43" = 140.776
extrude "Extrusion3" add sketch "Sketch3" against normal blind 9.525
sketch "Sketch5" plane through (282.4312, -38.1, -57.15) normal (0, 0, -1) x (-1, 0, 0)
  arc A0 (102.8699, 20.33) -> (107.0999, 16.1) centre (107.0999, 20.33) ccw
  arc A1 (106.5363, 60.1) -> (102.8699, 55.012) centre (107.0065, 55.8962) ccw
  line L0 (102.8699, 20.33) -> (102.8699, 55.012)
  line L1 (81.2799, 59.896) -> (81.2799, 15.446)
  line L2 (-0.0001, 63.071) -> (78.1049, 63.071)
  line L3 (0, 12.271) -> (78.105, 12.271)
  line L4 (233.5363, 16.1) -> (107.0999, 16.1)
  line L5 (234.0983, 60.1) -> (106.5363, 60.1)
  arc A2 (238.2699, 55.012) -> (234.0983, 60.1) centre (234.1279, 55.8701) ccw
  line L6 (238.2699, 20.33) -> (238.2699, 55.012)
  arc A3 (233.5363, 16.1) -> (238.2699, 20.33) centre (234.04, 20.2999) ccw
  arc A4 (81.2799, 59.896) -> (78.1049, 63.071) centre (78.1049, 59.896) ccw
  arc A5 (78.105, 12.271) -> (81.2799, 15.446) centre (78.1049, 15.446) ccw
  line L7 (490.855, 12.7) -> (568.96, 12.7)
  line L8 (490.855, 63.5) -> (568.9599, 63.5)
  line L9 (330.69, 20.33) -> (330.69, 55.012)
  arc A6 (330.69, 20.33) -> (334.92, 16.1) centre (334.92, 20.33) ccw
  line L10 (461.9184, 60.1) -> (334.3564, 60.1)
  line L11 (461.3564, 16.1) -> (334.92, 16.1)
  arc A7 (461.3564, 16.1) -> (466.09, 20.33) centre (461.8601, 20.2999) ccw
  arc A8 (466.09, 55.012) -> (461.9184, 60.1) centre (461.948, 55.8701) ccw
  arc A9 (334.3564, 60.1) -> (330.69, 55.012) centre (334.8266, 55.8962) ccw
  line L12 (466.09, 20.33) -> (466.09, 55.012)
  arc A10 (487.68, 15.875) -> (490.855, 12.7) centre (490.855, 15.875) ccw
  arc A11 (490.855, 63.5) -> (487.68, 60.325) centre (490.855, 60.325) ccw
  line L13 (487.68, 60.325) -> (487.68, 15.875)
  line L14 (-0.0001, 76.2) -> (568.9599, 76.2)
  line L15 (0, 0) -> (568.96, 0)
  line L16 (568.9599, 76.2) -> (568.9599, 63.5)
  line L17 (568.96, 12.7) -> (568.96, 0)
  line L18 (-0.0001, 76.2) -> (-0.0001, 63.071)
  line L19 (0, 12.271) -> (0, 0)
  point P0 (282.4312, 38.1)
  dimension "d60" = 135.4
  dimension "d61" = 44
  dimension "d62" = 78.105
  dimension "d63" = 50.8
  dimension "d64" = 44.45
  dimension "d65" = 21.59
  dimension "d66" = 135.4
  dimension "d67" = 44
  dimension "d68" = 78.105
  dimension "d69" = 50.8
  dimension "d70" = 568.96
  dimension "d71" = 21.59
extrude "Extrusion5" add sketch "Sketch5" along normal blind 9.525
sketch "Sketch6" plane through (282.4313, 24.971, -57.15) normal (1, 0, 0) x (0, 0, -1)
  point P0 (-57.15, -24.971)
properties part number "BT-BTK120-DriveFrameTube" material "Aluminum 6061"
